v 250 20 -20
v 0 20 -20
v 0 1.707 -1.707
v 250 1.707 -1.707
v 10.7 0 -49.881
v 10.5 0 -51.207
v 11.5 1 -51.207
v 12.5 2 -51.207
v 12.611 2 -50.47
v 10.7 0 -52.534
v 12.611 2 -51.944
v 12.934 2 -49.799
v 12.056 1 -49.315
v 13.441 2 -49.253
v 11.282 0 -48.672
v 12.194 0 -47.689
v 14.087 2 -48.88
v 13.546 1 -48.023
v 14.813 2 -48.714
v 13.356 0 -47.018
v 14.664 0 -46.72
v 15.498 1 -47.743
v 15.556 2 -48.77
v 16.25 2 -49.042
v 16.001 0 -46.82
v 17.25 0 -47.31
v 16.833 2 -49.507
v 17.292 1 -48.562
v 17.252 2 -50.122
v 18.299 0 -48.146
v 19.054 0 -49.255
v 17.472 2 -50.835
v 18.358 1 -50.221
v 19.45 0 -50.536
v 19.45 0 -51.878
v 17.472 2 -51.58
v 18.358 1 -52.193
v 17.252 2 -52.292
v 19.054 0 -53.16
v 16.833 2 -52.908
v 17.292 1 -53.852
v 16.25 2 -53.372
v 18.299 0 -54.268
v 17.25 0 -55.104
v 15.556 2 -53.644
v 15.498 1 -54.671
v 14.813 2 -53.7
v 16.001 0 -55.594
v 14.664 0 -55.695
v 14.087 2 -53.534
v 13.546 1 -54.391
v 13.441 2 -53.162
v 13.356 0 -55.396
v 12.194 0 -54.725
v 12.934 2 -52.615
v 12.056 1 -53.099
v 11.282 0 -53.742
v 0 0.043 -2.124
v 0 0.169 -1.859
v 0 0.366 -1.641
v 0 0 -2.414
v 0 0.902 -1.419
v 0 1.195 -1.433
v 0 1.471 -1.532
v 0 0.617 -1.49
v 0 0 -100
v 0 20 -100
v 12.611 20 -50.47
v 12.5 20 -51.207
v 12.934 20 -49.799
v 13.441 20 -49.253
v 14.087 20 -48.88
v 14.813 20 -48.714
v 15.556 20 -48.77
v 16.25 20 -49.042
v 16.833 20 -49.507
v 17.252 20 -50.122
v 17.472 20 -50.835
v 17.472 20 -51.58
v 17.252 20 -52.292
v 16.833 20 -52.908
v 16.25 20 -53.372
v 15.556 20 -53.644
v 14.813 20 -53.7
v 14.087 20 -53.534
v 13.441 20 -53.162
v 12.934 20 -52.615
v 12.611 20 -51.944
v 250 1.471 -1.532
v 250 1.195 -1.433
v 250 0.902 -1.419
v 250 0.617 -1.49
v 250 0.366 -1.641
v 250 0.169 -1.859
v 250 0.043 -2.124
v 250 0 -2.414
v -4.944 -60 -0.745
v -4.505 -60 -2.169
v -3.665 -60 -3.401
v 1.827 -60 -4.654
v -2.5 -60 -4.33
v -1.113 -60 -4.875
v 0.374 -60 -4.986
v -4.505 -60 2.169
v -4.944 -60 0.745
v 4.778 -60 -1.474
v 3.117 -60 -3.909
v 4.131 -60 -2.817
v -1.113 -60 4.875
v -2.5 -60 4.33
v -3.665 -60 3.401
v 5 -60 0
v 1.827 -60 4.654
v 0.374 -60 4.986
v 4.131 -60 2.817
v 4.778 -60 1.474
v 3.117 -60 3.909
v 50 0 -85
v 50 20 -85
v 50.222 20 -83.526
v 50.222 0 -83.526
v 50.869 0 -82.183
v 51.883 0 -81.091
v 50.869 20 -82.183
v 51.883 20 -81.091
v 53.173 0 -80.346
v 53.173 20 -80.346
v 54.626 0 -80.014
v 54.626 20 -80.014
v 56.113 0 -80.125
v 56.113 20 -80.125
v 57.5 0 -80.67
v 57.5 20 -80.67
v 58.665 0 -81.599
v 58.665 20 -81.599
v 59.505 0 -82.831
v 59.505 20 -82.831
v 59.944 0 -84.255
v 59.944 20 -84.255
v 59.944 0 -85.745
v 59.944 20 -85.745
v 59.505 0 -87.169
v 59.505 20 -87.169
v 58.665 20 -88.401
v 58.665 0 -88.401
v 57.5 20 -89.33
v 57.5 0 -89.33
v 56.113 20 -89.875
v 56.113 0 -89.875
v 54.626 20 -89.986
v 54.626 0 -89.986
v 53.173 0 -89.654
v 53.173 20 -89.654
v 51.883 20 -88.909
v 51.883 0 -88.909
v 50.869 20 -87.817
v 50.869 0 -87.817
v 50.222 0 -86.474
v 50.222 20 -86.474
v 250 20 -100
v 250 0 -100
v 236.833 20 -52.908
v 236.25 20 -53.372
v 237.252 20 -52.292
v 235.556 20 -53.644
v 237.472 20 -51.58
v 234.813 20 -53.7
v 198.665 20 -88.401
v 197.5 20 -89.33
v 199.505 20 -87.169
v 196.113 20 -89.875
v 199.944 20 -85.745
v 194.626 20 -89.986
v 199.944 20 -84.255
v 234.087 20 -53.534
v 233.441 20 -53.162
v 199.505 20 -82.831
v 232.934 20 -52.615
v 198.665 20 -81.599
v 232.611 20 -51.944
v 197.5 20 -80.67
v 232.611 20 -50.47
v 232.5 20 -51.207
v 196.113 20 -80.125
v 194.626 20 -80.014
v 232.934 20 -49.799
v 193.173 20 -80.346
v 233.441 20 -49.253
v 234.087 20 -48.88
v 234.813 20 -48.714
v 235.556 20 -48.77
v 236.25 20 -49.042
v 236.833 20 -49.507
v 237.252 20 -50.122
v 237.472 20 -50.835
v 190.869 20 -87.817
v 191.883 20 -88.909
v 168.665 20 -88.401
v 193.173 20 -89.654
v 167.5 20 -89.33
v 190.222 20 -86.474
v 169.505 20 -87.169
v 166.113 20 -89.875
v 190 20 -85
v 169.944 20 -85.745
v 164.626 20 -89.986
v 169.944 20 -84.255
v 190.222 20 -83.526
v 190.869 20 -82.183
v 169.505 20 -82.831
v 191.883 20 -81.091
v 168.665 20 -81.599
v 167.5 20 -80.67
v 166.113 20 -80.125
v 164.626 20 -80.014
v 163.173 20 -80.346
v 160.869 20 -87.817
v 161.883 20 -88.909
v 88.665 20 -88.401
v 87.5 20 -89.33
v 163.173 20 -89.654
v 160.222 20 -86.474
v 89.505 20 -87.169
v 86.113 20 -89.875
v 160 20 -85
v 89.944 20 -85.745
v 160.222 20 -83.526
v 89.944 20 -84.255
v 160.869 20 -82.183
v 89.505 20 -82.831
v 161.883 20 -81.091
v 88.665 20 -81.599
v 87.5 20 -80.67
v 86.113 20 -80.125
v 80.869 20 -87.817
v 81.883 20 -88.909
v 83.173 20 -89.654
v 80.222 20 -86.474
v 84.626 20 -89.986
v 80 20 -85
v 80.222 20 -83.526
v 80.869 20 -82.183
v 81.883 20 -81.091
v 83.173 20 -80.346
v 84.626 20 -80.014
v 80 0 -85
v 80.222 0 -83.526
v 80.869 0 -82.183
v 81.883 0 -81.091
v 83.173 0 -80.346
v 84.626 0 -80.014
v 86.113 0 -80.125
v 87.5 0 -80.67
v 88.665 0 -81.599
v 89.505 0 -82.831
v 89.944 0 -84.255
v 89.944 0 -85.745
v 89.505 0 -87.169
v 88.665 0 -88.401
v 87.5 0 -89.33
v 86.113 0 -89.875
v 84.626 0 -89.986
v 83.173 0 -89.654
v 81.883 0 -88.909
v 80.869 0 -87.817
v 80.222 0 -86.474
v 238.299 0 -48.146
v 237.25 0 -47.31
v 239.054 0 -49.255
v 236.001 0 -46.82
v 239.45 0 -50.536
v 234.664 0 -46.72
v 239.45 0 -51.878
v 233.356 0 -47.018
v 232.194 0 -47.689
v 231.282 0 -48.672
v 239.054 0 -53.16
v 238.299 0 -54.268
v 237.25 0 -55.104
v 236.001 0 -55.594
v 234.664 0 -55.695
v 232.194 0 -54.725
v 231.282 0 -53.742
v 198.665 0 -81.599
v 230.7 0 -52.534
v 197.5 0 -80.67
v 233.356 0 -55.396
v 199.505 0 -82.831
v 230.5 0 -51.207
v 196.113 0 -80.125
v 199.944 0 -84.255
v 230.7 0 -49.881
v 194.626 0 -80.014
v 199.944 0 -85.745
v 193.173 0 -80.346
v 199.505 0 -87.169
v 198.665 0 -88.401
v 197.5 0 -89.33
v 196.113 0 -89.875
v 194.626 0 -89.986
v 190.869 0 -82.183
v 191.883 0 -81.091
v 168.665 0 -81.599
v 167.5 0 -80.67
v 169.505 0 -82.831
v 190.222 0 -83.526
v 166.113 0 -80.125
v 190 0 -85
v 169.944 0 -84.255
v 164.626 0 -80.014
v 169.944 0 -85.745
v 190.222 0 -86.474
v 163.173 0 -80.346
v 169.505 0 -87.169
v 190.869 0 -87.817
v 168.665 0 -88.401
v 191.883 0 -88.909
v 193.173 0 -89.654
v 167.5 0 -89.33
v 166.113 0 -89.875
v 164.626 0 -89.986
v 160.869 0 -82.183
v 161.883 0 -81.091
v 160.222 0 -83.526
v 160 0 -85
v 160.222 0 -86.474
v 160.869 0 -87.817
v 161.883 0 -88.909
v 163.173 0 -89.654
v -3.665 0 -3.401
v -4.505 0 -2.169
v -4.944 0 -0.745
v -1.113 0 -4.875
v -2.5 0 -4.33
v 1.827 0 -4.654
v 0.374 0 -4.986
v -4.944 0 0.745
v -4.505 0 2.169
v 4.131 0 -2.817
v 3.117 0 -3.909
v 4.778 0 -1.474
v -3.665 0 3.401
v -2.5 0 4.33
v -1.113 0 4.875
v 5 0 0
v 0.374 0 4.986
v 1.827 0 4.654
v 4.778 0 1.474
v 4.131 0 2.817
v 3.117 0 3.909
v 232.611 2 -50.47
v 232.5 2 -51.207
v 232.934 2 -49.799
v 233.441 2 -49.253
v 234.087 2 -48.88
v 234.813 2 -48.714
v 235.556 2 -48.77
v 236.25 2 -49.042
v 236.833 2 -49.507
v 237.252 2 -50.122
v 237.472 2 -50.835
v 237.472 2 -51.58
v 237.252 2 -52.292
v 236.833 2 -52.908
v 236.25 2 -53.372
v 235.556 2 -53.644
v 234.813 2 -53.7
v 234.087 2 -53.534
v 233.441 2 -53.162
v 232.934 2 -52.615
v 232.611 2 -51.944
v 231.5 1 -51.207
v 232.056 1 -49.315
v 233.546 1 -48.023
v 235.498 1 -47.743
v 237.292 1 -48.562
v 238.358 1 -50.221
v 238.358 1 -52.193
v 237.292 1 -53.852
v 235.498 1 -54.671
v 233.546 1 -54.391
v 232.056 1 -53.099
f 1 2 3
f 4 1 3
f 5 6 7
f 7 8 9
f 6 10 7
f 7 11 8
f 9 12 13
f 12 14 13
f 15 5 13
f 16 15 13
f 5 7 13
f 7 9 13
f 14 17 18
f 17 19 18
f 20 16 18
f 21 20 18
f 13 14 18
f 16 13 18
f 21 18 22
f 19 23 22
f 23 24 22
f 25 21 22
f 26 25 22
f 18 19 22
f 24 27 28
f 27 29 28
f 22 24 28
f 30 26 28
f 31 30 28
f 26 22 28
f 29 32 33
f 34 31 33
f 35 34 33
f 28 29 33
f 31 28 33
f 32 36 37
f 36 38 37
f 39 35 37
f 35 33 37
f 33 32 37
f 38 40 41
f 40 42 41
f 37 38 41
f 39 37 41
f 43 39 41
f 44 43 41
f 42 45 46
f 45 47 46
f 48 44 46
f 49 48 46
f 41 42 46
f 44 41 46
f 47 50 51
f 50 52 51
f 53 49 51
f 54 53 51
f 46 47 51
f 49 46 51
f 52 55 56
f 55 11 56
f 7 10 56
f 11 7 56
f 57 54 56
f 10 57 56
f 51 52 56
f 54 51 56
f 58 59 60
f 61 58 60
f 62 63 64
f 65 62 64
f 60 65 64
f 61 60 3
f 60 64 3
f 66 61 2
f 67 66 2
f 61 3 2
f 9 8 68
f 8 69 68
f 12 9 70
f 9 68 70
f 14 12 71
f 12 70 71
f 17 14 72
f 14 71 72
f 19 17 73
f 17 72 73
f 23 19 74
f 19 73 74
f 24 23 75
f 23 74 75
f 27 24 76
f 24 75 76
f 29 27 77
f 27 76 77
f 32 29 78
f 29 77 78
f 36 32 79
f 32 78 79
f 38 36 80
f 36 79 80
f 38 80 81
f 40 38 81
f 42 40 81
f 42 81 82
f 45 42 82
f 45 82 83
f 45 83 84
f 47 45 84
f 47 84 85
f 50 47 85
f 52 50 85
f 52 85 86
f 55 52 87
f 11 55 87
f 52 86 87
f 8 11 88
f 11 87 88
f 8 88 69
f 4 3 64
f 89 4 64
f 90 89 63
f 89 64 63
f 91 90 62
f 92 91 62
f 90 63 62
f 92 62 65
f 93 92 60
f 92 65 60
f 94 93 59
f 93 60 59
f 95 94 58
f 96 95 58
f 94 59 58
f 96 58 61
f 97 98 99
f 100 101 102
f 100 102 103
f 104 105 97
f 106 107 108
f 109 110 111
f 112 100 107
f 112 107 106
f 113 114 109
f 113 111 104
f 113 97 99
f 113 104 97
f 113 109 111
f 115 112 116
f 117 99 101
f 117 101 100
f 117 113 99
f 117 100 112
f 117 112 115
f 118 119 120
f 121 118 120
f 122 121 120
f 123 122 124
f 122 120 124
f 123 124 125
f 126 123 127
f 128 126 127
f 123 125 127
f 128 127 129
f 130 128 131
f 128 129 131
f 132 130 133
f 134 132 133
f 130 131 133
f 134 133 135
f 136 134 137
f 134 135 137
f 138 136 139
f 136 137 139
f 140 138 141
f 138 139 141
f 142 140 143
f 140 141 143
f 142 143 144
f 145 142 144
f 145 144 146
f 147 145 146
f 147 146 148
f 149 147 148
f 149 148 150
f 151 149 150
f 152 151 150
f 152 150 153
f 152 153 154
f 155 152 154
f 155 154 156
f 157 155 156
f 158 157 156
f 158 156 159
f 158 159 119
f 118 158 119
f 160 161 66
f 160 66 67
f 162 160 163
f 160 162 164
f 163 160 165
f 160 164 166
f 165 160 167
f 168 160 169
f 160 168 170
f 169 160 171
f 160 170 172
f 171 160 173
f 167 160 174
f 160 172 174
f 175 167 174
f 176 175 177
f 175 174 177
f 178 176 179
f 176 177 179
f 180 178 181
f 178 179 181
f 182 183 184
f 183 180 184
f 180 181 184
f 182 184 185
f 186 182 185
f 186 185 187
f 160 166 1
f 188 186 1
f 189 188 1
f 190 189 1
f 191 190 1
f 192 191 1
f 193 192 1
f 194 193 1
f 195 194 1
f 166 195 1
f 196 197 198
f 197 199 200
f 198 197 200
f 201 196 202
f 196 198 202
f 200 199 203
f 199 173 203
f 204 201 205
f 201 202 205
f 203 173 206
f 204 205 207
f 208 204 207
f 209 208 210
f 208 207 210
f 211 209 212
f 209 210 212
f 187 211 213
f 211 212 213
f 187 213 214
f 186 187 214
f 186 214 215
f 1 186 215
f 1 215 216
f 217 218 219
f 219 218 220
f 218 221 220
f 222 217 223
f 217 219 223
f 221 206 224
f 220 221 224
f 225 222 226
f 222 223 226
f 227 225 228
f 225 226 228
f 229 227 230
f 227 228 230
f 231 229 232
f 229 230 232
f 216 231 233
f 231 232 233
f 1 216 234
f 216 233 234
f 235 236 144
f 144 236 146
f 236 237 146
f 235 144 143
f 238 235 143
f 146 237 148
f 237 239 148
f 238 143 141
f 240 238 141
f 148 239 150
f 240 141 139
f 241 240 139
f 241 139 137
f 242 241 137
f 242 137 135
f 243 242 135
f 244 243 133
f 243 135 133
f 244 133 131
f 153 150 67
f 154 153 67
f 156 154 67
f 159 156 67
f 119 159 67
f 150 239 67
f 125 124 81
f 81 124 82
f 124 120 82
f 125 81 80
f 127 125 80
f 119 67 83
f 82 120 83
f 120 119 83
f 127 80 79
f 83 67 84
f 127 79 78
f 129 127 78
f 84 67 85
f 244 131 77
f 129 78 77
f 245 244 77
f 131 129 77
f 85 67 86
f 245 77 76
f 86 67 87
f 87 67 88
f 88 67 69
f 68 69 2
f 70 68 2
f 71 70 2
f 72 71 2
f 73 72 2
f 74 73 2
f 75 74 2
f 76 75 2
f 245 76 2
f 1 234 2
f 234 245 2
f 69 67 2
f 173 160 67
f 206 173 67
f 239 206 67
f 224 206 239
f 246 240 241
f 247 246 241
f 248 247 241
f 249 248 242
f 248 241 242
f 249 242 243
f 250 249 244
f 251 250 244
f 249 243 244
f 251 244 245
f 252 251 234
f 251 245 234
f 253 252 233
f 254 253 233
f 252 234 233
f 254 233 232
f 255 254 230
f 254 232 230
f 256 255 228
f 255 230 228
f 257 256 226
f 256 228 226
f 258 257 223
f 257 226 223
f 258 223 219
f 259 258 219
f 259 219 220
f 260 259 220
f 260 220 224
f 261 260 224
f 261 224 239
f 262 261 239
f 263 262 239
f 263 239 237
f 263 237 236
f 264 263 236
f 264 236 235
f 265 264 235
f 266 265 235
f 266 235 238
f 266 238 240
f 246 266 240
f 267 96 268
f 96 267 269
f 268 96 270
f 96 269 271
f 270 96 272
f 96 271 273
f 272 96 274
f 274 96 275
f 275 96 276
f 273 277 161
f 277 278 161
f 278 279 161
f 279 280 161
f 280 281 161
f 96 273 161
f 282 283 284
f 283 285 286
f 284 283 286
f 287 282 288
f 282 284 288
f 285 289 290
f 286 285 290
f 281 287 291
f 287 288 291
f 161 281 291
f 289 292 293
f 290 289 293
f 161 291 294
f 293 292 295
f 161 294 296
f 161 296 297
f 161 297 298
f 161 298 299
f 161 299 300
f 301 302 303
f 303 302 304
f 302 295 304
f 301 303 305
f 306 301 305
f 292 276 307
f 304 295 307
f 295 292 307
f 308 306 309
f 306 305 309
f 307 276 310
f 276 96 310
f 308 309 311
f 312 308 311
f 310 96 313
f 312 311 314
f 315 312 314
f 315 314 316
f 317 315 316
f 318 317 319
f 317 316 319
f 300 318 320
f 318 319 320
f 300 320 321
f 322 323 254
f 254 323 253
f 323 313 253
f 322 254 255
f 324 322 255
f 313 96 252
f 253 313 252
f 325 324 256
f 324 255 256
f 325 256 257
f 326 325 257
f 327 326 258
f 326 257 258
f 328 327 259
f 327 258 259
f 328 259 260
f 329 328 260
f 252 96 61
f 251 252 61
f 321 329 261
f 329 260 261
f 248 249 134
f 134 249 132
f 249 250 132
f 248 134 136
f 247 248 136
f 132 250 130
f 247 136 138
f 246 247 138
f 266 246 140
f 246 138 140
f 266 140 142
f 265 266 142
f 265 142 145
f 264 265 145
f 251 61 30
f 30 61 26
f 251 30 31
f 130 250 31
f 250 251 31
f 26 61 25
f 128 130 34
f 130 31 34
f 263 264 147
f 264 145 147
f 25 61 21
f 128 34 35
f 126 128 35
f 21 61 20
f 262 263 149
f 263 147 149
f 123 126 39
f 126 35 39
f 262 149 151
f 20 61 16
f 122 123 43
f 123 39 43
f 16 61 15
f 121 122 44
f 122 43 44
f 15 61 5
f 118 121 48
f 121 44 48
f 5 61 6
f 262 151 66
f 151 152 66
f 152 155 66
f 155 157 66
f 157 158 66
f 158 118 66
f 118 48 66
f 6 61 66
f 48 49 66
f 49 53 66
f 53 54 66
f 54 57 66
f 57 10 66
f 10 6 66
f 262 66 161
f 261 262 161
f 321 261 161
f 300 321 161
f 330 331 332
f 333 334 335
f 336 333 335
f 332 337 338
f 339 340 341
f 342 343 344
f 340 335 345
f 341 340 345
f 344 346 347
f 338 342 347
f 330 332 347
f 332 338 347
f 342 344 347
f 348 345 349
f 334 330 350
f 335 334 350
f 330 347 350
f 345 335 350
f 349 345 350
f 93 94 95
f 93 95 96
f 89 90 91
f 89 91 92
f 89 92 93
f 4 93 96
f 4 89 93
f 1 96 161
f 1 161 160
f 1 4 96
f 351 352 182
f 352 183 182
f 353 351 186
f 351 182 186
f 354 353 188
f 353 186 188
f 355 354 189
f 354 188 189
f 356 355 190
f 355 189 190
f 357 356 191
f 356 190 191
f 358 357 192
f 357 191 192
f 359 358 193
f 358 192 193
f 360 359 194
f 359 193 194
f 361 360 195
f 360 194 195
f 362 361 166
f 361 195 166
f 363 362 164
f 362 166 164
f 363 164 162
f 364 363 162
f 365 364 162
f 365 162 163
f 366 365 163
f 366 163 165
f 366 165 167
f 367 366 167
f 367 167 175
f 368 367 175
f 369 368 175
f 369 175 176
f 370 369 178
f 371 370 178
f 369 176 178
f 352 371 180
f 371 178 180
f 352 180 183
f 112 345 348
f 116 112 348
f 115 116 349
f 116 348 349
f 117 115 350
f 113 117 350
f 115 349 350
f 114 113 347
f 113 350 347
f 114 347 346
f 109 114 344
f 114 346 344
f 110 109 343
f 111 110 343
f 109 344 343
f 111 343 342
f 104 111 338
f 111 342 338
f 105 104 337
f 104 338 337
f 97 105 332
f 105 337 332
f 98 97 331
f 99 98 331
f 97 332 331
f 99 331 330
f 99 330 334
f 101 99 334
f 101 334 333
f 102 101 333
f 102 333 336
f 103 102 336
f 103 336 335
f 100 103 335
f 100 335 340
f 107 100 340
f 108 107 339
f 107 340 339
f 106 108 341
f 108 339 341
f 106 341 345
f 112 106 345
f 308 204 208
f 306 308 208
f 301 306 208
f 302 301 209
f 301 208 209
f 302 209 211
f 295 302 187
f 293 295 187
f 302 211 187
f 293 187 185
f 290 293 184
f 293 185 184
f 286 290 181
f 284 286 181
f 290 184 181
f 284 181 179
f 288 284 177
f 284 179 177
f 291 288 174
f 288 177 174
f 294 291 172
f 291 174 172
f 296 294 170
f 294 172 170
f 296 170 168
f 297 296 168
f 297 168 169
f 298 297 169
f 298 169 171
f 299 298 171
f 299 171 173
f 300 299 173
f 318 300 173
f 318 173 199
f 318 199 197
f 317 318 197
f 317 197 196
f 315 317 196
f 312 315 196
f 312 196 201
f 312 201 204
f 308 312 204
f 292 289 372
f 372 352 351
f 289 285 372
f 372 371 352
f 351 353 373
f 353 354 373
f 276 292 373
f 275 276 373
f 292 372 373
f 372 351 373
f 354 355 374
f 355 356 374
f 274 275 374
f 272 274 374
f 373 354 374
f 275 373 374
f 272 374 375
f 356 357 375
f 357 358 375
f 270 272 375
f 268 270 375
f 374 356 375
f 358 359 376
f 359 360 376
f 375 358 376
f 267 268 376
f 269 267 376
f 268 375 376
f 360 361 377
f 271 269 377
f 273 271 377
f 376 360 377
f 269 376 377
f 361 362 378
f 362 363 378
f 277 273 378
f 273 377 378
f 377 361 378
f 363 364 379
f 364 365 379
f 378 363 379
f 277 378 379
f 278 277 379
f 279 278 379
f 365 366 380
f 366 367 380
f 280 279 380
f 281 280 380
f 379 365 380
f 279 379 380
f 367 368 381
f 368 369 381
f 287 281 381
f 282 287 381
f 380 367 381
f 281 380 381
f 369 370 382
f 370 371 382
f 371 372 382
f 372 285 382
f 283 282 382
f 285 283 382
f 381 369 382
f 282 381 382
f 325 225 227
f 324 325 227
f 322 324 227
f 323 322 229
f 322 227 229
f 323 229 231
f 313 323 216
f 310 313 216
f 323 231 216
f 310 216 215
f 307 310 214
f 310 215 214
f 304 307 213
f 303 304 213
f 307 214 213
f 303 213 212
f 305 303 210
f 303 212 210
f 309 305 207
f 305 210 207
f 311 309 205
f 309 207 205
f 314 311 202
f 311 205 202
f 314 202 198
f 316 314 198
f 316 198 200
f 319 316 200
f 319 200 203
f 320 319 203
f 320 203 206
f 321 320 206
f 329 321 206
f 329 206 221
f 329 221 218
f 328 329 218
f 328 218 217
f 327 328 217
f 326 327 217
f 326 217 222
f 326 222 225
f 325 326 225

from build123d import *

# Parameters (mm, degrees)
F1_DEPTH       = 250
F4_D           = 10
F5_D           = 5
F5_CSINK_D     = 9
F5_CSINK_ANGLE = 90
F6_R           = 5
F7_DEPTH       = 60


with BuildPart() as f1:
    # F0 (on Right) → F1 (new body)
    with BuildSketch(Plane.YZ):
        with BuildLine():
            Line((20, -20), (1.707107, -1.707107))
            ThreePointArc((1.707107, -1.707107), (0.617317, -1.490334), (0, -2.414214))
            Line((0, -2.414214), (0, -100))
            Line((0, -100), (20, -100))
            Line((20, -100), (20, -20))
        make_face()
    extrude(amount=F1_DEPTH)

    # F4 (through all)
    with Locations(Plane.XZ):
        with Locations((55, -85), (85, -85), (165, -85), (195, -85)):
            Hole(F4_D / 2)

    # F5 (through all)
    with Locations(Plane.XZ):
        with Locations((15, -51.207107), (235, -51.207107)):
            CounterSinkHole(F5_D / 2, F5_CSINK_D / 2, counter_sink_angle=F5_CSINK_ANGLE)


with BuildPart() as f7:
    # F6 (on Front) → F7 (new body)
    with BuildSketch(Plane.XZ):
        Circle(F6_R)
    extrude(amount=F7_DEPTH)


solid = Compound([f1.part, f7.part])
